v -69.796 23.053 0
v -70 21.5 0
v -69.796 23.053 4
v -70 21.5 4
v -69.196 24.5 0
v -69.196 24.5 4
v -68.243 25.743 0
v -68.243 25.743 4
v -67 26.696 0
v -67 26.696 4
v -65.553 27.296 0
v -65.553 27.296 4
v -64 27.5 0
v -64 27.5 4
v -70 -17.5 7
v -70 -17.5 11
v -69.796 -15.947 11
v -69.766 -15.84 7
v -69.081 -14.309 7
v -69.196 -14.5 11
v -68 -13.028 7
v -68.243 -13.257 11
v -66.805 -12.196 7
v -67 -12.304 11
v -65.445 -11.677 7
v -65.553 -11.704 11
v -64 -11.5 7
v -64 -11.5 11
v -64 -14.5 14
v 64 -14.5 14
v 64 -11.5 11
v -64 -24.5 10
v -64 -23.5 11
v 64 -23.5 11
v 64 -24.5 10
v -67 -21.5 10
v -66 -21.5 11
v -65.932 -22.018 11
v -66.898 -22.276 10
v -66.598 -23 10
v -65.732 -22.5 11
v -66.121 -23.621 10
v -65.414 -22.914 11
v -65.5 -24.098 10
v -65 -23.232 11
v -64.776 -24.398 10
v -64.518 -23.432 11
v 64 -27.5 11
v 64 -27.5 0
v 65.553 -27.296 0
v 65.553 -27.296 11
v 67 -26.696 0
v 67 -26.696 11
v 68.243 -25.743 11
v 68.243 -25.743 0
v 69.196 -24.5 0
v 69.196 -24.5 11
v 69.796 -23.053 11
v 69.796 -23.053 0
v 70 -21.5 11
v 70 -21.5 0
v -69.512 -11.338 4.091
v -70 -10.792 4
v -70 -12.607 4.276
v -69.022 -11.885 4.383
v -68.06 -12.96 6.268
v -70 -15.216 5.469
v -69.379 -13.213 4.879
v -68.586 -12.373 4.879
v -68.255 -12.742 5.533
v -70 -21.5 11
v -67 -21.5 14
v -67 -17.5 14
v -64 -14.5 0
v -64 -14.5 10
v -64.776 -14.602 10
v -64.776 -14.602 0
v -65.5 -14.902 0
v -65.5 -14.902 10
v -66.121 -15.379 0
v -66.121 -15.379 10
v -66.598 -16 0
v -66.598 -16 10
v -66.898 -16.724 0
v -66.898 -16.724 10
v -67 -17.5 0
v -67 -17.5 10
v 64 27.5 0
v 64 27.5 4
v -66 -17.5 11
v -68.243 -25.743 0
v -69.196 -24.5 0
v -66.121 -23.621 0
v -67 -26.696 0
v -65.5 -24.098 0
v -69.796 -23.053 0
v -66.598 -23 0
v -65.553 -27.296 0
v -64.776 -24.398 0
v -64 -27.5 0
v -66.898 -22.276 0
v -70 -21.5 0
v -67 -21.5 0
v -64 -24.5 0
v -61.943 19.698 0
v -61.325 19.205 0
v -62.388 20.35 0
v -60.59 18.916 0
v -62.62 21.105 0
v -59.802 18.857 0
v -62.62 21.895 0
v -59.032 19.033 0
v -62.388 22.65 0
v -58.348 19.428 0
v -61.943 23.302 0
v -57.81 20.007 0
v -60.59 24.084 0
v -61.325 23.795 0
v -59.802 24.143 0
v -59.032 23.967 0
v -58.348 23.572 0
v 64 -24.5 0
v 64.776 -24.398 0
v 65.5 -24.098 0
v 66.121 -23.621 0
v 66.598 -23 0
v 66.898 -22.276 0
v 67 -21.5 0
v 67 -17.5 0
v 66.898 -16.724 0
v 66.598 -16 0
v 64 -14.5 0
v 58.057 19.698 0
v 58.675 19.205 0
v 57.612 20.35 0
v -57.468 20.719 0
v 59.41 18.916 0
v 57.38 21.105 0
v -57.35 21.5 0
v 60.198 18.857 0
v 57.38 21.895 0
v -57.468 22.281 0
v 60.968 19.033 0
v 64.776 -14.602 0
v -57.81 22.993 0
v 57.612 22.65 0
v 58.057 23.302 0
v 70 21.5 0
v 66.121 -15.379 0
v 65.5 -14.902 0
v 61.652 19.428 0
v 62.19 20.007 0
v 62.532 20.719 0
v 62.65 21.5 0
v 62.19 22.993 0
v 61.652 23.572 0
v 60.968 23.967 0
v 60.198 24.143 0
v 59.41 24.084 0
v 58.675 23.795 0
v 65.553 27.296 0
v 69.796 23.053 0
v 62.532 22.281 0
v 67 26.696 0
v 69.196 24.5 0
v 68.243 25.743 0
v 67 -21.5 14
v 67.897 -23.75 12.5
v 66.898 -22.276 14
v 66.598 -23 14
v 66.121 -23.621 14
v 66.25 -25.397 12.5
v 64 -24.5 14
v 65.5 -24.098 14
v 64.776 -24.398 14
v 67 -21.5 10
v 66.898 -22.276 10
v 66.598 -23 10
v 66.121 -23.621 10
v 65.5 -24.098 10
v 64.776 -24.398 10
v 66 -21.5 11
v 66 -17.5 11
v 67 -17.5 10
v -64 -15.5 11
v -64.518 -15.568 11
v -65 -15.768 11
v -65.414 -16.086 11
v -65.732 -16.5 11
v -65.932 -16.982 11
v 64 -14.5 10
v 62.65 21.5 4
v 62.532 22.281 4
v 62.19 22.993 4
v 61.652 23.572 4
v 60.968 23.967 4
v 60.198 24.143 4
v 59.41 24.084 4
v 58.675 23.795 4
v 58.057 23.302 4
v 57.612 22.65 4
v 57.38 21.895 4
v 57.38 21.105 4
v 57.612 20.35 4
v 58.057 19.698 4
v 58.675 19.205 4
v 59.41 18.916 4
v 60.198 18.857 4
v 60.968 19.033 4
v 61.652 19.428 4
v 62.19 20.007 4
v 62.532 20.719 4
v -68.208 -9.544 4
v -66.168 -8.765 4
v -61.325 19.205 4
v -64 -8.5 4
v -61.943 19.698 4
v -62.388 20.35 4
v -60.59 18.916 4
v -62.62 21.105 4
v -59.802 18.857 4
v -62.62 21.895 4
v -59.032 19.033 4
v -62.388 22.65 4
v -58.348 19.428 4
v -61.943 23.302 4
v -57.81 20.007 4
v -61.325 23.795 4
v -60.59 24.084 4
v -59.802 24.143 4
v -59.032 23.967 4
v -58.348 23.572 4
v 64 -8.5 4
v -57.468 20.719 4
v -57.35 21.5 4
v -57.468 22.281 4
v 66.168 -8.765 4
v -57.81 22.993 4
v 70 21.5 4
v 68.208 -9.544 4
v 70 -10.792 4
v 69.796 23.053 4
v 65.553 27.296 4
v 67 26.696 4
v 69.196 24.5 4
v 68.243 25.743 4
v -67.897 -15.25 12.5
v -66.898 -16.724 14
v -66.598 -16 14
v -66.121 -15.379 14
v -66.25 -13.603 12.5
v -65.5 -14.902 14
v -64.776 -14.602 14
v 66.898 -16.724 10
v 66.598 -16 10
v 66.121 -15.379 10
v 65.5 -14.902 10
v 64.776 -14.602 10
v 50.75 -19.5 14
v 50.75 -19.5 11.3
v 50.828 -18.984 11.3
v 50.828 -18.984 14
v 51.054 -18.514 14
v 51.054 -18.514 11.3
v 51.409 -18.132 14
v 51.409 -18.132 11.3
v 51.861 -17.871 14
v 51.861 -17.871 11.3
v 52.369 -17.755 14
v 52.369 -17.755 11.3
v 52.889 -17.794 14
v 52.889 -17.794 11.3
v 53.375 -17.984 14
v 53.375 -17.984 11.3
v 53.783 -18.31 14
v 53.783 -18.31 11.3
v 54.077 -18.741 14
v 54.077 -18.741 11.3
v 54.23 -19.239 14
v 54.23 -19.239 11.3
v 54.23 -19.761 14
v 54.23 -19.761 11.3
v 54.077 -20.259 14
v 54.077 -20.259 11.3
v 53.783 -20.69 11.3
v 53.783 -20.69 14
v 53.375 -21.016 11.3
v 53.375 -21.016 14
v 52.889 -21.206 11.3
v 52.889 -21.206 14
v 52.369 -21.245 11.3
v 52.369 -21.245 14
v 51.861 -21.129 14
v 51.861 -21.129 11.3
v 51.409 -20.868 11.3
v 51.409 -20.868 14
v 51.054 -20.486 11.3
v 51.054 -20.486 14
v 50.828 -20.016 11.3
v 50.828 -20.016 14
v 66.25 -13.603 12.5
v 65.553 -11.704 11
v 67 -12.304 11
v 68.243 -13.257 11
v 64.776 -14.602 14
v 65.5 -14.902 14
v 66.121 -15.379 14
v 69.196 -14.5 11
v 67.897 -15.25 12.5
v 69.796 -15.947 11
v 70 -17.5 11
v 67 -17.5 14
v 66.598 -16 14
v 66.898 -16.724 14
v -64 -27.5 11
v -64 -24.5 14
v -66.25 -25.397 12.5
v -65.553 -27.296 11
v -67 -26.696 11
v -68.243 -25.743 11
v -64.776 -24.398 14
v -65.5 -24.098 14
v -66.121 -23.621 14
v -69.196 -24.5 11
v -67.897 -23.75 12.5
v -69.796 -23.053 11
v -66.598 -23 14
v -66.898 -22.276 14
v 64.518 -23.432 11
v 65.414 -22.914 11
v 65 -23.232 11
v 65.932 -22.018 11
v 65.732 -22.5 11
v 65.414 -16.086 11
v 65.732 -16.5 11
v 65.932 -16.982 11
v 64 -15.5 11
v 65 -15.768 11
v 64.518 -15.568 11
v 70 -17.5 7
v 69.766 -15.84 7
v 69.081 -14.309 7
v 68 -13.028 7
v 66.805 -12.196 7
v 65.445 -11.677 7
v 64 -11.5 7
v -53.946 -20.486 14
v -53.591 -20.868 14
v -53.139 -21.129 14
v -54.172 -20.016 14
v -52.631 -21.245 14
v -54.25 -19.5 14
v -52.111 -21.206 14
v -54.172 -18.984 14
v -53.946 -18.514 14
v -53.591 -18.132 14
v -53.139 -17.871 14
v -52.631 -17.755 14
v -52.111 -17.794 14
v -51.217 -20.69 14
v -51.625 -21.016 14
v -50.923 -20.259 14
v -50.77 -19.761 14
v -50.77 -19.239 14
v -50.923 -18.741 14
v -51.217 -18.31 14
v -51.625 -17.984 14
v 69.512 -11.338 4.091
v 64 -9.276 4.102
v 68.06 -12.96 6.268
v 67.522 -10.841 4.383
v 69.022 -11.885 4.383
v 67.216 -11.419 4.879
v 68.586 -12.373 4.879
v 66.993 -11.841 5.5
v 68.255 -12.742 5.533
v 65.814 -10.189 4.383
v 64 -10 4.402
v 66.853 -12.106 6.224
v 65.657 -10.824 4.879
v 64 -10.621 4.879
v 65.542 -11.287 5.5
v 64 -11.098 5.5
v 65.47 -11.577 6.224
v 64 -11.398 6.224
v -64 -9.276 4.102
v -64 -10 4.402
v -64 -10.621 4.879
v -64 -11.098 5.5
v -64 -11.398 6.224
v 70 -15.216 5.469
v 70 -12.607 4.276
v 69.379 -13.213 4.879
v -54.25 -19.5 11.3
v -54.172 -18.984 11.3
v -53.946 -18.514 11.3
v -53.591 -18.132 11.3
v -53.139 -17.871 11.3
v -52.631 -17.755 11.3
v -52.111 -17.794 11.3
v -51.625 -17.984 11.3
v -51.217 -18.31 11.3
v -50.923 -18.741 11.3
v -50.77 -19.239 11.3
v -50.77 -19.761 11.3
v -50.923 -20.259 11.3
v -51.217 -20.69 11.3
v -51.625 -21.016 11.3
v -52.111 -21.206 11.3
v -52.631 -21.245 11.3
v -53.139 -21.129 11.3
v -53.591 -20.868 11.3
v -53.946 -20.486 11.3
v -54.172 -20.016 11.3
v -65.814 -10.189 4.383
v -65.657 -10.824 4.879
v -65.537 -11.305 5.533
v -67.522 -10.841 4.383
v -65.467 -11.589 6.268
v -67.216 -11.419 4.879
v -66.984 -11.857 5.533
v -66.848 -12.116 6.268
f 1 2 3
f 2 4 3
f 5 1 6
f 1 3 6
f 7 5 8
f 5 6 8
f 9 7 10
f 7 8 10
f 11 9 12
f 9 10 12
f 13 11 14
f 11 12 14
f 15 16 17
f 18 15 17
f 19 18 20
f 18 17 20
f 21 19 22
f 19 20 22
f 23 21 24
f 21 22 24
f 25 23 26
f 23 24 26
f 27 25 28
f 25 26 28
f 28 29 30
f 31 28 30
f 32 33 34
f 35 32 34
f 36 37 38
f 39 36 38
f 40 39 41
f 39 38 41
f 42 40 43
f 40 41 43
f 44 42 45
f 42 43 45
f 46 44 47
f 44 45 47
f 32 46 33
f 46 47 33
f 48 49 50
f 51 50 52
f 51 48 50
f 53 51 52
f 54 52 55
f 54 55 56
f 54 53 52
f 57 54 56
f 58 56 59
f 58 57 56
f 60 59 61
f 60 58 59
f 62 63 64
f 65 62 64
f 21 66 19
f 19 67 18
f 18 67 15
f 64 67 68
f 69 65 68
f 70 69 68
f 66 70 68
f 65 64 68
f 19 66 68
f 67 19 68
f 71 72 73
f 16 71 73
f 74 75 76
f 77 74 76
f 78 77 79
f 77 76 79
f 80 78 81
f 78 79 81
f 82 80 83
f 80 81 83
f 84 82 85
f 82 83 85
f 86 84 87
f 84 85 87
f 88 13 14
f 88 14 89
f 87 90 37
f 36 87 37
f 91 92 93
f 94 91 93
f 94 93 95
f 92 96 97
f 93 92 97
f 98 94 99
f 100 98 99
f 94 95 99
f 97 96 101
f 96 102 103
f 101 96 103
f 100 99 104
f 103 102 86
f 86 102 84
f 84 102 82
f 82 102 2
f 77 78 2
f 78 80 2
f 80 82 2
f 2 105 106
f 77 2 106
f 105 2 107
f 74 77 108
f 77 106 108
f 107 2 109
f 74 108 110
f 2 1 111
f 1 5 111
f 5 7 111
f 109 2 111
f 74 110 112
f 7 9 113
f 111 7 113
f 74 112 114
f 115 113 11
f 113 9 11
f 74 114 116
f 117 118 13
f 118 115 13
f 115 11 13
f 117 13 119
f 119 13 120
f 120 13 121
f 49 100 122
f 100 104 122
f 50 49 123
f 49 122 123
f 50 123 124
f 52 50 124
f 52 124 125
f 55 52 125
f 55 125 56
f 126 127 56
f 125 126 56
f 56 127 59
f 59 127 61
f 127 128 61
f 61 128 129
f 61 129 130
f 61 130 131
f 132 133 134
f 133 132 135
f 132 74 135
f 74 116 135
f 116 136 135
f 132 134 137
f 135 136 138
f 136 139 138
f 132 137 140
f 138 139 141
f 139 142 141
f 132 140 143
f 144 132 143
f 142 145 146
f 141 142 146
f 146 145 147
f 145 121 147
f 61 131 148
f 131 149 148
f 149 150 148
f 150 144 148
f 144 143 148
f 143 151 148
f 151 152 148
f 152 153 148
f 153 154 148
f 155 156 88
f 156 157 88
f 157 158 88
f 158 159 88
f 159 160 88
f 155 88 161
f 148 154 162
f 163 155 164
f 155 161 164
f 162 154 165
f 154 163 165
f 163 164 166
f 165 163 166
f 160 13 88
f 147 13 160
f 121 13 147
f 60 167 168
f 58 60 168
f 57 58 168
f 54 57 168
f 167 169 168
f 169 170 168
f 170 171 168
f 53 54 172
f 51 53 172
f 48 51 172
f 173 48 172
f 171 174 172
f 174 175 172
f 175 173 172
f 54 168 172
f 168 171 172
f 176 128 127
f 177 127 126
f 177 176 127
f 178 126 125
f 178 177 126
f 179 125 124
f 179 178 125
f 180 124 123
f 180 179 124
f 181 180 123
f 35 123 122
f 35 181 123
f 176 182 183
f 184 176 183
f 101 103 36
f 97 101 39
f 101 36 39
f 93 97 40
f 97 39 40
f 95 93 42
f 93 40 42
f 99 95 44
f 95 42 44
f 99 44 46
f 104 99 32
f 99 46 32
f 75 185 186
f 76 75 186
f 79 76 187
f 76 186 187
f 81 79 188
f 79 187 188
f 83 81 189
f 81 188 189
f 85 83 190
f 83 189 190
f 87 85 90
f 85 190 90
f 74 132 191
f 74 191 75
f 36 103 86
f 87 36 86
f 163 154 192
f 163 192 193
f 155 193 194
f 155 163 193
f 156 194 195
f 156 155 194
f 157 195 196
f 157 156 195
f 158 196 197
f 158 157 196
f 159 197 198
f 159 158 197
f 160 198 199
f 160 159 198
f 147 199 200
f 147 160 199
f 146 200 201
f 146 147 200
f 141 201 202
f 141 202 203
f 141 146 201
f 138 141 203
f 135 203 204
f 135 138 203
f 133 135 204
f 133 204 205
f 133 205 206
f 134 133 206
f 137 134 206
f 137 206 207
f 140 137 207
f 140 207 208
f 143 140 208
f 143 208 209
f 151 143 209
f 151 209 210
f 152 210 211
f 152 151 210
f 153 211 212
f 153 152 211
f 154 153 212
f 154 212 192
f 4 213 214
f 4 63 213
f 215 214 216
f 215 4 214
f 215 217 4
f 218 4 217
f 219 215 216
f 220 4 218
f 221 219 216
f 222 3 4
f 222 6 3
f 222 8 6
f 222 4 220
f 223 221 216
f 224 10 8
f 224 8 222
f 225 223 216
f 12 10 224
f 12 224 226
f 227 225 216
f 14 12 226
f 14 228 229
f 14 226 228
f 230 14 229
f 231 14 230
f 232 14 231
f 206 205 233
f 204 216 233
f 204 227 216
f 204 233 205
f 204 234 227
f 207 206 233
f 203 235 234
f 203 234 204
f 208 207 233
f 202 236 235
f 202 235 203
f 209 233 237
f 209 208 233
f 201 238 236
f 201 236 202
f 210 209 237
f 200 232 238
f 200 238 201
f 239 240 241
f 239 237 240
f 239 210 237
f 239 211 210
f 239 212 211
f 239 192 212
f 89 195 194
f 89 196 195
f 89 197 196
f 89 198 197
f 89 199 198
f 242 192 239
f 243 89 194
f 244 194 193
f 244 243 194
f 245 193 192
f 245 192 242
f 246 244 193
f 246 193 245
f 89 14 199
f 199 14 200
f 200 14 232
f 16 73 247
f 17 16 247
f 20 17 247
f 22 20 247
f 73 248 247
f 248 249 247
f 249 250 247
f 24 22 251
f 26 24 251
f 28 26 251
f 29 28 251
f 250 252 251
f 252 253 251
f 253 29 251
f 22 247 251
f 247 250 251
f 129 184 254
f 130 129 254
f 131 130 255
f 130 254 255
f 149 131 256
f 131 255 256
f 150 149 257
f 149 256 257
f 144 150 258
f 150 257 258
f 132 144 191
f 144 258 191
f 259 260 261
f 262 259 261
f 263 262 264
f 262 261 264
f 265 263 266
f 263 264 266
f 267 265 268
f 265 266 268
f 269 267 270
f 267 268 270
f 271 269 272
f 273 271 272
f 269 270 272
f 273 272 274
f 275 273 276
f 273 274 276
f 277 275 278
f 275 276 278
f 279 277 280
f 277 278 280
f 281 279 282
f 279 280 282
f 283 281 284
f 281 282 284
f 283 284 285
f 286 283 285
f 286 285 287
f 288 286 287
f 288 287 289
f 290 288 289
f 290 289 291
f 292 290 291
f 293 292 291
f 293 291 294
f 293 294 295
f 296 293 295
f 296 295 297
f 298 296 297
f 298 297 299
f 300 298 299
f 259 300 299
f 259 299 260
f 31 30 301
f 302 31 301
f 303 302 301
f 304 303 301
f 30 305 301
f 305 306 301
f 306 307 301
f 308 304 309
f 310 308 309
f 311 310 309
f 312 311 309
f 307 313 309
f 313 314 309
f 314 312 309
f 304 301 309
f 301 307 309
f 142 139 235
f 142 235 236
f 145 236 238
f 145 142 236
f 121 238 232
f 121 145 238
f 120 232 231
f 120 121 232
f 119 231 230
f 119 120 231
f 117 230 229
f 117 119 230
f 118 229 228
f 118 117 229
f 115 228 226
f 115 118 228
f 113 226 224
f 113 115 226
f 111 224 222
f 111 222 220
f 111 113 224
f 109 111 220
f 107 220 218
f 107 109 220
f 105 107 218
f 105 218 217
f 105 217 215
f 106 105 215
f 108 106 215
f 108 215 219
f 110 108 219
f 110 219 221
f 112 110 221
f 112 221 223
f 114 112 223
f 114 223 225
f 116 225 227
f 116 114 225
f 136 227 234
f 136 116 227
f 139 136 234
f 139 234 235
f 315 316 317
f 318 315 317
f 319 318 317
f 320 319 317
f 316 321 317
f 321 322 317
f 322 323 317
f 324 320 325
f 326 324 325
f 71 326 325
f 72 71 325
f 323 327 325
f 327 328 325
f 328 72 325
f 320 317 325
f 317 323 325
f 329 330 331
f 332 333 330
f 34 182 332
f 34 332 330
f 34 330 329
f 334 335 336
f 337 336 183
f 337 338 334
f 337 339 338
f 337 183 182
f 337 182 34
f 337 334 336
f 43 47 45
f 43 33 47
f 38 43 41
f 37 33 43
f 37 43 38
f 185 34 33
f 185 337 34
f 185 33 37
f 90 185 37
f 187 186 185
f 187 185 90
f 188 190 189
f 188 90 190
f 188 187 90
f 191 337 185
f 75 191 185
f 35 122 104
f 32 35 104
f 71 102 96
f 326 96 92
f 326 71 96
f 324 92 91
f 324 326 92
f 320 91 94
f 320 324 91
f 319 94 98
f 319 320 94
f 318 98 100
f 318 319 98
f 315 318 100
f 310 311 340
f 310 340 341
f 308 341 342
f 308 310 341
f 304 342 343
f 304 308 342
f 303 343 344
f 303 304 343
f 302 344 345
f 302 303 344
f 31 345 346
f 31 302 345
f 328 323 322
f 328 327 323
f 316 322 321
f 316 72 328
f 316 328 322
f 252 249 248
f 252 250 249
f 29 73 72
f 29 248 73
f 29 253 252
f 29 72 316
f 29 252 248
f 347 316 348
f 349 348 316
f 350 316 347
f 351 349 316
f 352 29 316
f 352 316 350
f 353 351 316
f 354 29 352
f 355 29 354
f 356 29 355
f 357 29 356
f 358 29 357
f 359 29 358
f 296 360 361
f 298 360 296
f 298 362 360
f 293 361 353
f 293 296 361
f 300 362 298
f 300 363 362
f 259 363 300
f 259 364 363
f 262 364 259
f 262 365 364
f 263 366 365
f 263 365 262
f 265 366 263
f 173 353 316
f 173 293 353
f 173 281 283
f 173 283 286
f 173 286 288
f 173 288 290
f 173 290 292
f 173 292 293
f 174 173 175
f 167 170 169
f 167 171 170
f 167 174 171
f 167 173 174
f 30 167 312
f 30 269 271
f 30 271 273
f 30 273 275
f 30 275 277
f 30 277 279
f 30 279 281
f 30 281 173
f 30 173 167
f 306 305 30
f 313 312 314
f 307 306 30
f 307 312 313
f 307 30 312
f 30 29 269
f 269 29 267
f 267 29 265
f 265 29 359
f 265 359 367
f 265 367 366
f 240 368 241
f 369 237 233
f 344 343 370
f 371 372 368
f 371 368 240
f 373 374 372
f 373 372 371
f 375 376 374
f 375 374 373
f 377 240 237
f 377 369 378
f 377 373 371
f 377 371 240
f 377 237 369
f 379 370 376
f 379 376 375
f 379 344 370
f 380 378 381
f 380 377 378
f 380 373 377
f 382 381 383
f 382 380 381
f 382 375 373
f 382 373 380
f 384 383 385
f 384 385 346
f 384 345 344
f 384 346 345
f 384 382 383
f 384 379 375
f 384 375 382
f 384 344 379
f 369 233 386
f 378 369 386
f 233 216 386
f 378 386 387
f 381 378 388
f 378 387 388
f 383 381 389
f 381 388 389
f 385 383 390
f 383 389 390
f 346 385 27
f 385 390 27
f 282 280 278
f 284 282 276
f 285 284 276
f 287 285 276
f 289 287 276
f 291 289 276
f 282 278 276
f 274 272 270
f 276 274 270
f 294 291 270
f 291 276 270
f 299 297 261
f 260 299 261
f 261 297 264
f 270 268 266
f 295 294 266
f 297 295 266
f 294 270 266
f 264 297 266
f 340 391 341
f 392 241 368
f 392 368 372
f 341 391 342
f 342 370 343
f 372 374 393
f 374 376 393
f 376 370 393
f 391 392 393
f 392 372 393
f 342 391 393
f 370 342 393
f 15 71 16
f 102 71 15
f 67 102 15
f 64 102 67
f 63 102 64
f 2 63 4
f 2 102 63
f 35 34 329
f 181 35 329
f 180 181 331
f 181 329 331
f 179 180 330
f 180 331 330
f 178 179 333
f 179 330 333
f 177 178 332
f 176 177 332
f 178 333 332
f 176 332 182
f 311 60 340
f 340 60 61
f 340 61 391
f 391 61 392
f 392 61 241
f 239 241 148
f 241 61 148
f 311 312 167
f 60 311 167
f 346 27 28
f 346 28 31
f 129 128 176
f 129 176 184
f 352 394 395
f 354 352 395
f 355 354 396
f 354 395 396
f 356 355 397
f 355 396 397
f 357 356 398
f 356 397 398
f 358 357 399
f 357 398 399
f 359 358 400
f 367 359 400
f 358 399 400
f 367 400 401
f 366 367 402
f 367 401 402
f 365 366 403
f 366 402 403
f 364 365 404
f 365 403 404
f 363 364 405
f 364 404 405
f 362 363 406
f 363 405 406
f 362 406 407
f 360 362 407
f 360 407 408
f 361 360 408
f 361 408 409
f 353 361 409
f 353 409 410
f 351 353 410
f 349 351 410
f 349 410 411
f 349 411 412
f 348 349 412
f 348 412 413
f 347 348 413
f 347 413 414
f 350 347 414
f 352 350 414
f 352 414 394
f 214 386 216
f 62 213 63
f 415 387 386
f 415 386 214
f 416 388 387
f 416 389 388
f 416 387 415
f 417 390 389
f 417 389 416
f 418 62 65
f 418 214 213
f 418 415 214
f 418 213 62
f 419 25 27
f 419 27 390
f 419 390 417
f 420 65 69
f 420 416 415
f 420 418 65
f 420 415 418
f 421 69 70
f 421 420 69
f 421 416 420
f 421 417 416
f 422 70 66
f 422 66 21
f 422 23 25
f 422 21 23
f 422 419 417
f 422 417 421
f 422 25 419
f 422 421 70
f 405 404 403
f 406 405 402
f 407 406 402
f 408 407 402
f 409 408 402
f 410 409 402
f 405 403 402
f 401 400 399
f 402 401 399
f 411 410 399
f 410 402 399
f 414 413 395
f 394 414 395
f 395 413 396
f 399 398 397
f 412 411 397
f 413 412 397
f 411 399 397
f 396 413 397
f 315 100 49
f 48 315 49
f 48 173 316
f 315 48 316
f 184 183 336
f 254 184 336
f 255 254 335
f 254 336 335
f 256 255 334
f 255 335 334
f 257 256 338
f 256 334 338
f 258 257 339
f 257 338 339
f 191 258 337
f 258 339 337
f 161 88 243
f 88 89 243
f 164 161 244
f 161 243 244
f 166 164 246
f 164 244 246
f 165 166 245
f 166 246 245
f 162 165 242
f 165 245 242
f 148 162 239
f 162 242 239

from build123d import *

# Parameters (mm, degrees)
SKETCH1_W           = 140
SKETCH1_H           = 55
SKETCH1_R           = 2.65
BOSS_EXTRUDE1_DEPTH = 4
SKETCH2_W           = 140
SKETCH2_H           = 16
BOSS_EXTRUDE2_DEPTH = 10
SKETCH3_W           = 134
SKETCH3_H           = 10
CUT_EXTRUDE1_DEPTH  = 11
CUT_EXTRUDE2_START  = -0.3
SKETCH4_R           = 1.75
CUT_EXTRUDE2_DEPTH  = 76.708223239
FILLET1_R           = 3
FILLET2_R           = 6
FILLET3_R           = 3
CHAMFER1_SIZE       = 1
CHAMFER2_SIZE       = 3


with BuildPart() as part:
    # Sketch1 → Boss-Extrude1 (new body)
    with BuildSketch(Plane.XY):
        Rectangle(SKETCH1_W, SKETCH1_H)
        with Locations((-60, 21.5)):
            Circle(SKETCH1_R, mode=Mode.SUBTRACT)
        with Locations((60, 21.5)):
            Circle(SKETCH1_R, mode=Mode.SUBTRACT)
    extrude(amount=BOSS_EXTRUDE1_DEPTH)

    # Sketch2 → Boss-Extrude2 (add)
    with BuildSketch(Plane.XY.offset(4)):
        with Locations((0, -19.5)):
            Rectangle(SKETCH2_W, SKETCH2_H)
    extrude(amount=BOSS_EXTRUDE2_DEPTH)

    # Sketch3 → Cut-Extrude1 (cut)
    with BuildSketch(Plane(origin=(0, 0, 0), x_dir=(-1, 0, 0), z_dir=(0, 0, -1))):
        with Locations((0, -19.5)):
            Rectangle(SKETCH3_W, SKETCH3_H)
    extrude(amount=-CUT_EXTRUDE1_DEPTH, mode=Mode.SUBTRACT)

    # Sketch4 → Cut-Extrude2 (cut, through all)
    with BuildSketch(Plane(origin=(0, 0, 11), x_dir=(-1, 0, 0), z_dir=(0, 0, -1)).offset(CUT_EXTRUDE2_START)):
        with Locations((52.5, -19.5)):
            Circle(SKETCH4_R)
        with Locations((-52.5, -19.5)):
            Circle(SKETCH4_R)
    extrude(amount=-CUT_EXTRUDE2_DEPTH, mode=Mode.SUBTRACT)

    # Fillet1
    fillet1_edges = [part.edges().sort_by_distance(p)[0] for p in [
        (67, -14.5, 5.5),
        (67, -24.5, 5.5),
        (-67, -24.5, 5.5),
        (-67, -14.5, 5.5),
    ]]
    fillet(fillet1_edges, radius=FILLET1_R)

    # Fillet2
    fillet2_edges = [part.edges().sort_by_distance(p)[0] for p in [
        (70, -11.5, 9),
        (-70, -11.5, 9),
        (70, -27.5, 7),
        (-70, -27.5, 7),
        (-70, 27.5, 2),
        (70, 27.5, 2),
    ]]
    fillet(fillet2_edges, radius=FILLET2_R)

    # Fillet3
    fillet3_edges = [part.edges().sort_by_distance(p)[0] for p in [
        (68.242640687, -13.257359313, 4),
        (0, -11.5, 4),
        (-68.242640687, -13.257359313, 4),
    ]]
    fillet(fillet3_edges, radius=FILLET3_R)

    # Chamfer1
    chamfer1_edges = [part.edges().sort_by_distance(p)[0] for p in [
        (0, -14.5, 11),
        (-67, -19.5, 11),
        (67, -19.5, 11),
        (0, -24.5, 11),
        (66.121320344, -15.378679656, 11),
        (66.121320344, -23.621320344, 11),
        (-66.121320344, -23.621320344, 11),
        (-66.121320344, -15.378679656, 11),
    ]]
    chamfer(chamfer1_edges, length=CHAMFER1_SIZE)

    # Chamfer2
    chamfer2_edges = [part.edges().sort_by_distance(p)[0] for p in [
        (-70, -19.5, 14),
        (0, -11.5, 14),
        (70, -19.5, 14),
        (0, -27.5, 14),
        (68.242640687, -25.742640687, 14),
        (68.242640687, -13.257359313, 14),
        (-68.242640687, -25.742640687, 14),
        (-68.242640687, -13.257359313, 14),
    ]]
    chamfer(chamfer2_edges, length=CHAMFER2_SIZE)


solid = part.part
